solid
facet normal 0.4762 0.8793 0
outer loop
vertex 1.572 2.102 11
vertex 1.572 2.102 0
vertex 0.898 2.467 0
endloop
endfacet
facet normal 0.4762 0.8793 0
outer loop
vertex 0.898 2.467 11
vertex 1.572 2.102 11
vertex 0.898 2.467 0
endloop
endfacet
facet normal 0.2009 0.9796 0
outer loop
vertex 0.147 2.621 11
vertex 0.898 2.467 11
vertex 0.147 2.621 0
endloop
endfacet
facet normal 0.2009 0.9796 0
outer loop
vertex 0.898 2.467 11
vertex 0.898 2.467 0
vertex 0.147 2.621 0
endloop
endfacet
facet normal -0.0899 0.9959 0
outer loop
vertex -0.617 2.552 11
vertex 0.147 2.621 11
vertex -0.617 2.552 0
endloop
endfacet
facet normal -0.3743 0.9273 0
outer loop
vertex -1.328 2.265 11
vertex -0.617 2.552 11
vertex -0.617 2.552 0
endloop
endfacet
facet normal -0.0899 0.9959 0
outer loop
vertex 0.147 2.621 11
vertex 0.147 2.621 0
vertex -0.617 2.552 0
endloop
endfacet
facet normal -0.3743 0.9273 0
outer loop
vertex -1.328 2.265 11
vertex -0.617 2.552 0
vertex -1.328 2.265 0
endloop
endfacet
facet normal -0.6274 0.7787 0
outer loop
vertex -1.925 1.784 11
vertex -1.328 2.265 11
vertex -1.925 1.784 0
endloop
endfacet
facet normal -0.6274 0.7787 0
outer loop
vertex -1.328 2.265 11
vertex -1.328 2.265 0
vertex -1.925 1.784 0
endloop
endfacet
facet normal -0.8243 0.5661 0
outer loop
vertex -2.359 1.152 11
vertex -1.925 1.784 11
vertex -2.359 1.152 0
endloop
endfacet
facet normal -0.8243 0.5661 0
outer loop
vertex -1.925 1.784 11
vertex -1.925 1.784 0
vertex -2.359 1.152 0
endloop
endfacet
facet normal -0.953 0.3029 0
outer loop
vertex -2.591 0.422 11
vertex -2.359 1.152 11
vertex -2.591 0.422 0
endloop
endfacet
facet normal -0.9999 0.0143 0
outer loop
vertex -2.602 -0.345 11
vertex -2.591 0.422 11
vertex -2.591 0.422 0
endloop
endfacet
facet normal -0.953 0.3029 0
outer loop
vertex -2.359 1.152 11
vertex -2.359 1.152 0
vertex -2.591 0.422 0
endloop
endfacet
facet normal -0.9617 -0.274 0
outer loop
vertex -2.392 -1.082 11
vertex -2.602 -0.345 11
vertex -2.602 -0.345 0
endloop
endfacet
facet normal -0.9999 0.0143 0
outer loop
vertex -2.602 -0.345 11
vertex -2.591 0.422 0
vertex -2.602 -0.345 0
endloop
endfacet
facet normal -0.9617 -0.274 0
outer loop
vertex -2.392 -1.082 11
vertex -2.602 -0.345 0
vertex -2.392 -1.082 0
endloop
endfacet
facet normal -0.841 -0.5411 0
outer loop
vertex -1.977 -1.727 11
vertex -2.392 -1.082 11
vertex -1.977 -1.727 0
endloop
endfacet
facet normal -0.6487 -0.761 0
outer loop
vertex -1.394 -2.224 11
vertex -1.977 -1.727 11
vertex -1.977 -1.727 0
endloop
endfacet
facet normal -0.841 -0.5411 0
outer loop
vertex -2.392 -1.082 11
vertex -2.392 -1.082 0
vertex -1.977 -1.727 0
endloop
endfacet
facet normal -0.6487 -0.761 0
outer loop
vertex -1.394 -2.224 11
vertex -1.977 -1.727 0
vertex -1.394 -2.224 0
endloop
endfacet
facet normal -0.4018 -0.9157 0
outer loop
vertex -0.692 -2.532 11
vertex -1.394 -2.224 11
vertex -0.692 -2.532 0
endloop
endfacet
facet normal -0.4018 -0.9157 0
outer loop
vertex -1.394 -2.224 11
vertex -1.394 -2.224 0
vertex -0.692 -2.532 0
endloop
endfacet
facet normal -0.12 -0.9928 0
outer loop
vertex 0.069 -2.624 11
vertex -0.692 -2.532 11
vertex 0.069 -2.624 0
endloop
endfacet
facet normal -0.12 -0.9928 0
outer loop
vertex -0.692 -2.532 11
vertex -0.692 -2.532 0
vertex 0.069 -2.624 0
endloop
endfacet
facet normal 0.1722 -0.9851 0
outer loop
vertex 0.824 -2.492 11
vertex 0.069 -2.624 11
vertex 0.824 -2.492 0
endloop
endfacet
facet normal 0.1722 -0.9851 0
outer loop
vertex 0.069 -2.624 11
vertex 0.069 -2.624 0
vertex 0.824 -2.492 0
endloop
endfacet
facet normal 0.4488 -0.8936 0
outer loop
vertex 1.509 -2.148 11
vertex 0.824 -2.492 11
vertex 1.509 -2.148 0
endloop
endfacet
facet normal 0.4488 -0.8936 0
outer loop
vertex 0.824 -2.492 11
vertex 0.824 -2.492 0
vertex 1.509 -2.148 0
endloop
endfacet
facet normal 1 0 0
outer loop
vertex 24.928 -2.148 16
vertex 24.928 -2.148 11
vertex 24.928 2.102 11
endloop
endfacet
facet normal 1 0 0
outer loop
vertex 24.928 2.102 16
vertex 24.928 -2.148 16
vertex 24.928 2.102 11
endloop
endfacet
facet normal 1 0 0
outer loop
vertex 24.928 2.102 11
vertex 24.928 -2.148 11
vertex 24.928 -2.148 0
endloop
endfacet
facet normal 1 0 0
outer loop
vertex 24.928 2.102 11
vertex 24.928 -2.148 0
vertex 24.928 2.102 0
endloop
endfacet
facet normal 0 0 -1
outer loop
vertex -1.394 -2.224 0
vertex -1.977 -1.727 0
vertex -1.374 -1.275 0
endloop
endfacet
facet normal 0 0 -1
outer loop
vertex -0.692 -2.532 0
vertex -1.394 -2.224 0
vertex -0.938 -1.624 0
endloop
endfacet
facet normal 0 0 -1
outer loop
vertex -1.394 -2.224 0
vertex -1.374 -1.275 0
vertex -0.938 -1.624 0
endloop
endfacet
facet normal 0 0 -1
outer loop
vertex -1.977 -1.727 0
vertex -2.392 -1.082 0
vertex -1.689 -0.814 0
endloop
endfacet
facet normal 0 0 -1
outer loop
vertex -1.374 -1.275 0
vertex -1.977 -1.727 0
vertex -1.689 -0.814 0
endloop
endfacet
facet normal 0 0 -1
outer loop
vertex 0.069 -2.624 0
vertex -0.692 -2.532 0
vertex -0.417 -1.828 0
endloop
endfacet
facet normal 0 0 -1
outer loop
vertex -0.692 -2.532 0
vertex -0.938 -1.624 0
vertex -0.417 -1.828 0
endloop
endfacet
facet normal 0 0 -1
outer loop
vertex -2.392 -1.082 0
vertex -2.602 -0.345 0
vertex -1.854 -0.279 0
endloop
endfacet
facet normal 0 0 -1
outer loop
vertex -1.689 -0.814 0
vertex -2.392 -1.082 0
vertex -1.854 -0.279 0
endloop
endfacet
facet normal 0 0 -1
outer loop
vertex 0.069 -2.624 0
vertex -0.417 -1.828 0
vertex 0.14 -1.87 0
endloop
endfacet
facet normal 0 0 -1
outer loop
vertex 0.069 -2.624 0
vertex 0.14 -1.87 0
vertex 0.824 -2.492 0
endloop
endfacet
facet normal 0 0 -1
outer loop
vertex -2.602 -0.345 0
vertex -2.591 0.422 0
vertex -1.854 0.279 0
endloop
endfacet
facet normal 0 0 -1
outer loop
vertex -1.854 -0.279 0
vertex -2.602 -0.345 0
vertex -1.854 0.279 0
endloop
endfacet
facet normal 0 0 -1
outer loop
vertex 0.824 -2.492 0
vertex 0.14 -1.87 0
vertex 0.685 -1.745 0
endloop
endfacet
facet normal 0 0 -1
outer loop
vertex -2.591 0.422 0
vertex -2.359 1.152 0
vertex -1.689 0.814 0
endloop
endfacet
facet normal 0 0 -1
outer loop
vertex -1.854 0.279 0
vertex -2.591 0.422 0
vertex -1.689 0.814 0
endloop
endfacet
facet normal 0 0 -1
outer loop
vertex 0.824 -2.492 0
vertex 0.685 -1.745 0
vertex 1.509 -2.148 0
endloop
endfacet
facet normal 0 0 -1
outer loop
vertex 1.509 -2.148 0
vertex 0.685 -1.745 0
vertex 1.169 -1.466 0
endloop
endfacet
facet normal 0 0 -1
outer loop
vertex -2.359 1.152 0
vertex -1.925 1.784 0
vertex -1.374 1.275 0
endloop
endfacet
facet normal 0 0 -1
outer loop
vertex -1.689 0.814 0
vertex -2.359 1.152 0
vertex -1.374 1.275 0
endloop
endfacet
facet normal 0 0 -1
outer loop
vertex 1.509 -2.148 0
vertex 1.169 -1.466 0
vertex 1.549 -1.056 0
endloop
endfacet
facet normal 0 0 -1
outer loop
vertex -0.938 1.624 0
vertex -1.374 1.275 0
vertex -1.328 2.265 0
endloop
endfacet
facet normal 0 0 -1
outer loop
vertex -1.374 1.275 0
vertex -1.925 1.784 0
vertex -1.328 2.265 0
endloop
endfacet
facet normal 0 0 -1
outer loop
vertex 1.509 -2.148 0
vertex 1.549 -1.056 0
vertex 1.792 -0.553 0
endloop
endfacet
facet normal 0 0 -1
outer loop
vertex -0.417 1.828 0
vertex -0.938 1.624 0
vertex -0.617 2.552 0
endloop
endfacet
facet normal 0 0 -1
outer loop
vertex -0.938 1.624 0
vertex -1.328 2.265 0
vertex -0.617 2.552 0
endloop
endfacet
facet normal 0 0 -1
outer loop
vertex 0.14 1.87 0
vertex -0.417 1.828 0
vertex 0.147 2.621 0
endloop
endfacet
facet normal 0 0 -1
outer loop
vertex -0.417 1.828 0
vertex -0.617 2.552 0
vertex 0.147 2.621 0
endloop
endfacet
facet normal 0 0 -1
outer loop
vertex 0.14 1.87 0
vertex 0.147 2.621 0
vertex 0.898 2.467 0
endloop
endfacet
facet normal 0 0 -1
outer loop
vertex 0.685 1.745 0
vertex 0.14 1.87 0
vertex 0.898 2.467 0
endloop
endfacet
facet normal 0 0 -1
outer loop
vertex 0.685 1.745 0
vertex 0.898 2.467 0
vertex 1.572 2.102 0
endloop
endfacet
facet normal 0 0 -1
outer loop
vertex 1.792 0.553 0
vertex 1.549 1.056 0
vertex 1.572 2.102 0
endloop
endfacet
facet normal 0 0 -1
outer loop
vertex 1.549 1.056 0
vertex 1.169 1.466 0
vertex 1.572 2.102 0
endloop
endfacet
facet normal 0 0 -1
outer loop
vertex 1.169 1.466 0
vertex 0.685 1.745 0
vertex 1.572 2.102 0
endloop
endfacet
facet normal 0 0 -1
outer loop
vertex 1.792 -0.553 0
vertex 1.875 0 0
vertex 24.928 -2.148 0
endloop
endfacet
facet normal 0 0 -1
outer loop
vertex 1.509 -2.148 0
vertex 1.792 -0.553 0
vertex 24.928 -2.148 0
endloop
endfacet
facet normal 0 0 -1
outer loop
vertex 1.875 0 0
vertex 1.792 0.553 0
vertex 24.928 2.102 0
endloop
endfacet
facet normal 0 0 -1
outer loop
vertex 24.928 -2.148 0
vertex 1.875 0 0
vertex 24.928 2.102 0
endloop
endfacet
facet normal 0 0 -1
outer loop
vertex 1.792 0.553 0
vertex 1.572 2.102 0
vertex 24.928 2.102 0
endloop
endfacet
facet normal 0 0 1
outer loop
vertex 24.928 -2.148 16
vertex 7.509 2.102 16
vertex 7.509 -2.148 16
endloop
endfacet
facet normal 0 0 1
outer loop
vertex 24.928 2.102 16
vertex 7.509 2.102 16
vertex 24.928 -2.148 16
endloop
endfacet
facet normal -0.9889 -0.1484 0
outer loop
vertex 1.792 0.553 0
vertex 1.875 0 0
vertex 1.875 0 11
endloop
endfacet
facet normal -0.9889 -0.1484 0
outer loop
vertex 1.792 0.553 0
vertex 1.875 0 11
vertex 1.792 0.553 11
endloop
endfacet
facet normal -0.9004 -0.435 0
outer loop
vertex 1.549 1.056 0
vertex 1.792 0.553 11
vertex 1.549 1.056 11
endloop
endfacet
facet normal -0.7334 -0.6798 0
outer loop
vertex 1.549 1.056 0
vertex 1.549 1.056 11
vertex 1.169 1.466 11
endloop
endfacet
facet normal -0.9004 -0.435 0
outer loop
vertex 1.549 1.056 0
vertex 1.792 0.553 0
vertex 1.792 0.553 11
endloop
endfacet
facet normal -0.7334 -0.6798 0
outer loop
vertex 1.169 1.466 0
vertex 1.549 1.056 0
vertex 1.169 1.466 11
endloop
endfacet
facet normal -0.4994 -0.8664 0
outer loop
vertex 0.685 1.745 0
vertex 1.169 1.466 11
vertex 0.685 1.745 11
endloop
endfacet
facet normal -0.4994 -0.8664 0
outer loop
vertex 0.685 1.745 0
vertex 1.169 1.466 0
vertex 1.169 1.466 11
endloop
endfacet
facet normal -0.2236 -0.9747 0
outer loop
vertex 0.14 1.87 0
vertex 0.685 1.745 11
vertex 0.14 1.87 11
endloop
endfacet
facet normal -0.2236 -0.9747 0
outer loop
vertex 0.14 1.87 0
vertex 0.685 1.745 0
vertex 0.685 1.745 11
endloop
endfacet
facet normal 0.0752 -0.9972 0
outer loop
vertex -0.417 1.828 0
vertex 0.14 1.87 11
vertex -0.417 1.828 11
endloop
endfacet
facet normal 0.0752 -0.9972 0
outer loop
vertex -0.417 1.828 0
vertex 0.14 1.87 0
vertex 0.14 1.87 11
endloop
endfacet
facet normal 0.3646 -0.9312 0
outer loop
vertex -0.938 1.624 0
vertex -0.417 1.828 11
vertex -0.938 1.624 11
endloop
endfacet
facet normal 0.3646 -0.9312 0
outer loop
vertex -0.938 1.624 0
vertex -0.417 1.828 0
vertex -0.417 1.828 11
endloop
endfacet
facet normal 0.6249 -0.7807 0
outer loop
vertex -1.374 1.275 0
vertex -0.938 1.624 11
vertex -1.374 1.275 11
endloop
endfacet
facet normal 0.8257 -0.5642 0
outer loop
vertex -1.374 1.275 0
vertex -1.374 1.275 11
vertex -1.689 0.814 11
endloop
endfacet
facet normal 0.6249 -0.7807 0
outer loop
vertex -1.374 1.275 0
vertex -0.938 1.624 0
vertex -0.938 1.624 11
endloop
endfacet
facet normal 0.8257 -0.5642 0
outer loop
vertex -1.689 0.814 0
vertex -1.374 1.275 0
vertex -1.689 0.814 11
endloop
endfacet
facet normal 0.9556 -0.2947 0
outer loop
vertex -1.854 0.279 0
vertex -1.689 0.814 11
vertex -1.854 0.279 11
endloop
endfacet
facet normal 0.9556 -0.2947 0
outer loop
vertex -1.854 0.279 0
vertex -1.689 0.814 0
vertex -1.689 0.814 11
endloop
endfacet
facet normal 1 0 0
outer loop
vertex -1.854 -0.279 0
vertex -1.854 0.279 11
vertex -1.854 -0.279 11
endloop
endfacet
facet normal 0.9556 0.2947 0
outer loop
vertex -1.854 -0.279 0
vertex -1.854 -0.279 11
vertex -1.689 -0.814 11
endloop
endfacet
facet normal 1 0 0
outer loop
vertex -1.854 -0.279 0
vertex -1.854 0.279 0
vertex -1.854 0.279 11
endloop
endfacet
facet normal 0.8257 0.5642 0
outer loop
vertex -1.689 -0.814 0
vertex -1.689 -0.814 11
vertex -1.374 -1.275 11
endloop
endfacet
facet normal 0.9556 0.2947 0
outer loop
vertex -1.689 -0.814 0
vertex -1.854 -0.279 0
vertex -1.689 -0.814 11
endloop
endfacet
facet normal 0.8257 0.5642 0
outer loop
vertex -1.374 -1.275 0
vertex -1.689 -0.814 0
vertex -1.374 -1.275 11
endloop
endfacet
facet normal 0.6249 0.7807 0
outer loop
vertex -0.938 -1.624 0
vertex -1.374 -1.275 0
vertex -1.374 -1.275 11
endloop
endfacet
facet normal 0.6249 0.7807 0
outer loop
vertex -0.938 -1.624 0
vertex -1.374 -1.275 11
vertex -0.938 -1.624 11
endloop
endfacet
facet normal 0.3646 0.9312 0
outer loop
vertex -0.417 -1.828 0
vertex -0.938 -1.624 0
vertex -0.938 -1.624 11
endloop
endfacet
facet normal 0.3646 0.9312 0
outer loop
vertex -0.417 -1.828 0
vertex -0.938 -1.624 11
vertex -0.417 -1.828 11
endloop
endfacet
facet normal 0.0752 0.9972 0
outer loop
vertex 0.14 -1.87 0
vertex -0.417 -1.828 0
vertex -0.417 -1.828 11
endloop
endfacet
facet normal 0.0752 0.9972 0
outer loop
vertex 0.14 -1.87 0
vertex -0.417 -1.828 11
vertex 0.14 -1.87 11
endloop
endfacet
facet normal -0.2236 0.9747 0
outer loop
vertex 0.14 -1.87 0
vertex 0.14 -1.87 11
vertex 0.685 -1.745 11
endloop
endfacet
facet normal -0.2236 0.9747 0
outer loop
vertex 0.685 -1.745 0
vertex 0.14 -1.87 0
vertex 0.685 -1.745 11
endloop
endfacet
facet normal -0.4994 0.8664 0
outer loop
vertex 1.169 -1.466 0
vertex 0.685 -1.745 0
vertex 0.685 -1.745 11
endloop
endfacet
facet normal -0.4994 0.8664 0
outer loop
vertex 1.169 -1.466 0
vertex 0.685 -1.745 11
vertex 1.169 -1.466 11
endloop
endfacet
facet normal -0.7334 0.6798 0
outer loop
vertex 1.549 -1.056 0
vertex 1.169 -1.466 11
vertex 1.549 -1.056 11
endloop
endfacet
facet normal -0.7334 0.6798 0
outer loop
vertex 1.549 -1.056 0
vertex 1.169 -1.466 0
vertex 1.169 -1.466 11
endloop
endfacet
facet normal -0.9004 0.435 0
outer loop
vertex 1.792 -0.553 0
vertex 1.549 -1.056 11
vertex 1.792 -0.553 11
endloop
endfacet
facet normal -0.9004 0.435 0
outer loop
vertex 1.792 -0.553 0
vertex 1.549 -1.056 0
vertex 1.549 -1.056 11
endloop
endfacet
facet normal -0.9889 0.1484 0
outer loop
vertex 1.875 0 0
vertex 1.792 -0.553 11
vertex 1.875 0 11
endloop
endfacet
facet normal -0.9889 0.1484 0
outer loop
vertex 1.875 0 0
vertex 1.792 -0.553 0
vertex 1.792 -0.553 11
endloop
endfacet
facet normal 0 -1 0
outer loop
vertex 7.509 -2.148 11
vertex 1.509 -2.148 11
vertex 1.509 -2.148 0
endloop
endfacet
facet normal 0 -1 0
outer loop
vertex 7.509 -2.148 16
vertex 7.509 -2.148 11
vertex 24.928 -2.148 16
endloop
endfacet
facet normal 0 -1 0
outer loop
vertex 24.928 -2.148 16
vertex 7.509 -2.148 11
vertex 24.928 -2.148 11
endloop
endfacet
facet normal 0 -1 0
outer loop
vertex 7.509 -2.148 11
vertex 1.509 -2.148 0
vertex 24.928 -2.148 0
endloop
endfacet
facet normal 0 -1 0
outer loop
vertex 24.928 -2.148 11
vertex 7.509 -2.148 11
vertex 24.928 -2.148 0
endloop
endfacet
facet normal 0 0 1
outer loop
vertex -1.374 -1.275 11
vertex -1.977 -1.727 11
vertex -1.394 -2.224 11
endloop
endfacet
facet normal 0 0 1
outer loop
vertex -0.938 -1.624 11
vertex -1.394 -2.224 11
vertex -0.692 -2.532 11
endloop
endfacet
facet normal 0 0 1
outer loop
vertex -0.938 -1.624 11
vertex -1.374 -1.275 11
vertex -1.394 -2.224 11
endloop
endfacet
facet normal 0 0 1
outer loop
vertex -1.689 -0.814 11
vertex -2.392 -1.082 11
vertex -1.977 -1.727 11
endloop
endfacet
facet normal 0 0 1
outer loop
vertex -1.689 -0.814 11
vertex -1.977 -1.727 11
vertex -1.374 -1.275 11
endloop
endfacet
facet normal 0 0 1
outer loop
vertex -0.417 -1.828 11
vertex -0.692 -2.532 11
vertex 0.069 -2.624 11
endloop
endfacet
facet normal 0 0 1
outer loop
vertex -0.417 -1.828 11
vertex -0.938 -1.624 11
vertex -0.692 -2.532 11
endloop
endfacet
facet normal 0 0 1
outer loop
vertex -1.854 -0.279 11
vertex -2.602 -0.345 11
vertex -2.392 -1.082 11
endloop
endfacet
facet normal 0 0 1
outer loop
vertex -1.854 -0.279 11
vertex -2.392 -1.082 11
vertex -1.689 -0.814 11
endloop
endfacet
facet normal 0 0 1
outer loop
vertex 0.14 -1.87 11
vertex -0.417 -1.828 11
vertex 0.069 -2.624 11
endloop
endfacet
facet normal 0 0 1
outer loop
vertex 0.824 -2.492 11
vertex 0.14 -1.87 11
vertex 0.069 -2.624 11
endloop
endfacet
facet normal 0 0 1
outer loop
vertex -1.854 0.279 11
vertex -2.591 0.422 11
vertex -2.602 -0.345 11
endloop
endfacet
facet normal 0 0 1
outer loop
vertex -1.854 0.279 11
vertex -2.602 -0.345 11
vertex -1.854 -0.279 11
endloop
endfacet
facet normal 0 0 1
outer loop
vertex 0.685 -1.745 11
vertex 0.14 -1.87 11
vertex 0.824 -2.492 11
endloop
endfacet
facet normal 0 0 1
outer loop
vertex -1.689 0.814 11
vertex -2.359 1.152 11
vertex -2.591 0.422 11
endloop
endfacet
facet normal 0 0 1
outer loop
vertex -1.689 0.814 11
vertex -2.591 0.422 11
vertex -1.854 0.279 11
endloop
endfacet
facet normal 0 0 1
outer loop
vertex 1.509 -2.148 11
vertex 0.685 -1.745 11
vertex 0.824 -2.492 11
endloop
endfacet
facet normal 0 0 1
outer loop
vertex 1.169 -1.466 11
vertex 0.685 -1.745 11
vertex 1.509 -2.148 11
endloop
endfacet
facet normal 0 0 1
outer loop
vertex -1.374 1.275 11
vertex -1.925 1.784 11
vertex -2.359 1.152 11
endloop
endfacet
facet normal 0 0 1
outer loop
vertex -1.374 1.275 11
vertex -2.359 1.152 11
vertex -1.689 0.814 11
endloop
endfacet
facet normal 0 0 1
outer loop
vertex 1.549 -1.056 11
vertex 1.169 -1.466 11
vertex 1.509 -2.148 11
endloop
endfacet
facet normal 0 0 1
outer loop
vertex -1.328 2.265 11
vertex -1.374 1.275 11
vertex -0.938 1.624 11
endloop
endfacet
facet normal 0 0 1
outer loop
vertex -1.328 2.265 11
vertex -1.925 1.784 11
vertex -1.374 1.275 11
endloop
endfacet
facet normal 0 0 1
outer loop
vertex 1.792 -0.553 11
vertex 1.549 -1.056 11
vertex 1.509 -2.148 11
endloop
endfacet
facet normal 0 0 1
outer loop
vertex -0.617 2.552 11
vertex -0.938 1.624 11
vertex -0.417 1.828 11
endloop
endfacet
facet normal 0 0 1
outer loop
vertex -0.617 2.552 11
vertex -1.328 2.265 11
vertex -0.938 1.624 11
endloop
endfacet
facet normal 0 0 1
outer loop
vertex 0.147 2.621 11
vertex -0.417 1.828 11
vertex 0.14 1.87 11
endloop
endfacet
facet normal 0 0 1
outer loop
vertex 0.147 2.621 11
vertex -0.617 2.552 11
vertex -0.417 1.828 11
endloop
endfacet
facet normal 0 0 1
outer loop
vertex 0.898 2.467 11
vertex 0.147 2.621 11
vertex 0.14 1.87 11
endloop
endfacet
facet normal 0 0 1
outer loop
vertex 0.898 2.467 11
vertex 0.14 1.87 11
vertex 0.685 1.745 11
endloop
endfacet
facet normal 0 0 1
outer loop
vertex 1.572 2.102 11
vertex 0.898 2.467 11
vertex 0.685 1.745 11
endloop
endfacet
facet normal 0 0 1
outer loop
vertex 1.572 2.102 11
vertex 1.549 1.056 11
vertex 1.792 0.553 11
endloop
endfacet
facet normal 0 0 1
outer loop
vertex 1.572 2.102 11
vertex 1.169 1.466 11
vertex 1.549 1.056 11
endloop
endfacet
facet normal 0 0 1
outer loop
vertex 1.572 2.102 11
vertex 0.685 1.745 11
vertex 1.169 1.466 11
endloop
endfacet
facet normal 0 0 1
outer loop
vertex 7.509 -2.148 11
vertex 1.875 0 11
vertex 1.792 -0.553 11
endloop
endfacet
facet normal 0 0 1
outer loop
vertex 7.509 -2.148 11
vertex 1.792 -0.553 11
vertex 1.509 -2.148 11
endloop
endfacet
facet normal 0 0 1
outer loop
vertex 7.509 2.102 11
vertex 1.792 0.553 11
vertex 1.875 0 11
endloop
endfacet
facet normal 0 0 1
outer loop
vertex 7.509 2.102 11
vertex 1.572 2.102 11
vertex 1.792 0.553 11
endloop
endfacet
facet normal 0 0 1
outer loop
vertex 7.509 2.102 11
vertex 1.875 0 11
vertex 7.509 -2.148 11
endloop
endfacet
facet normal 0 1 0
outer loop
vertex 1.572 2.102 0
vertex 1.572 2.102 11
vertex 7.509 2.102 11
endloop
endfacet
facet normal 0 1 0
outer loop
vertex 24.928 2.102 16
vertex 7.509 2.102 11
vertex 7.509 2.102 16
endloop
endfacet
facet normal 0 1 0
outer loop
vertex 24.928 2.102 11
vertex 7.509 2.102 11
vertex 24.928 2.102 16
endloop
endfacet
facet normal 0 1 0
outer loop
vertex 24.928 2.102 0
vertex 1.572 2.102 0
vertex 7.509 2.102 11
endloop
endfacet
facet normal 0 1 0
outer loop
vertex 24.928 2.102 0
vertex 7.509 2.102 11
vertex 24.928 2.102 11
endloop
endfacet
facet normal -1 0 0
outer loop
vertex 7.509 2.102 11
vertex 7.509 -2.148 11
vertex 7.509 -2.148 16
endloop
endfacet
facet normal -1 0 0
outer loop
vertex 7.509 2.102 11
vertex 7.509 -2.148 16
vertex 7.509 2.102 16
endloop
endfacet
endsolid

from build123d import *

# Parameters (mm, degrees)
F0_R     = 1.875
F1_DEPTH = 11
F2_W     = 17.4188611699
F2_H     = 4.25
F3_DEPTH = 5


# Not quite as in the source:
# - a feature names something its author has since deleted; it is built from what else it names


with BuildPart() as f1:
    # F0 (on Top) → F1 (new body)
    with BuildSketch(Plane.XY):
        with BuildLine():
            ThreePointArc((1.5092688833, -2.1477272727), (2.3294265194, -1.2101227585), (2.625, 0))
            ThreePointArc((2.625, 0), (2.347022952, 1.1756310061), (1.5719651333, 2.1022727273))
            ThreePointArc((1.5719651333, 2.1022727273), (-2.6247144161, 0.0387199415), (1.5092688833, -2.1477272727))
        make_face()
        Circle(F0_R, mode=Mode.SUBTRACT)
        with BuildLine():
            ThreePointArc((1.5719651333, 2.1022727273), (2.347022952, 1.1756310061), (2.625, 0))
            ThreePointArc((2.625, 0), (2.3294265194, -1.2101227585), (1.5092688833, -2.1477272727))
            Line((1.5092688833, -2.1477272727), (24.9281300532, -2.1477272727))
            Line((24.9281300532, -2.1477272727), (24.9281300532, 2.1022727273))
            Line((24.9281300532, 2.1022727273), (1.5719651333, 2.1022727273))
        make_face()
    extrude(amount=F1_DEPTH)

    # F2 (on face) → F3 (join)
    with BuildSketch(Plane.XY.offset(11)):
        with Locations((16.2186994682, -0.0227272727)):
            Rectangle(F2_W, F2_H)
    extrude(amount=F3_DEPTH)


solid = f1.part
